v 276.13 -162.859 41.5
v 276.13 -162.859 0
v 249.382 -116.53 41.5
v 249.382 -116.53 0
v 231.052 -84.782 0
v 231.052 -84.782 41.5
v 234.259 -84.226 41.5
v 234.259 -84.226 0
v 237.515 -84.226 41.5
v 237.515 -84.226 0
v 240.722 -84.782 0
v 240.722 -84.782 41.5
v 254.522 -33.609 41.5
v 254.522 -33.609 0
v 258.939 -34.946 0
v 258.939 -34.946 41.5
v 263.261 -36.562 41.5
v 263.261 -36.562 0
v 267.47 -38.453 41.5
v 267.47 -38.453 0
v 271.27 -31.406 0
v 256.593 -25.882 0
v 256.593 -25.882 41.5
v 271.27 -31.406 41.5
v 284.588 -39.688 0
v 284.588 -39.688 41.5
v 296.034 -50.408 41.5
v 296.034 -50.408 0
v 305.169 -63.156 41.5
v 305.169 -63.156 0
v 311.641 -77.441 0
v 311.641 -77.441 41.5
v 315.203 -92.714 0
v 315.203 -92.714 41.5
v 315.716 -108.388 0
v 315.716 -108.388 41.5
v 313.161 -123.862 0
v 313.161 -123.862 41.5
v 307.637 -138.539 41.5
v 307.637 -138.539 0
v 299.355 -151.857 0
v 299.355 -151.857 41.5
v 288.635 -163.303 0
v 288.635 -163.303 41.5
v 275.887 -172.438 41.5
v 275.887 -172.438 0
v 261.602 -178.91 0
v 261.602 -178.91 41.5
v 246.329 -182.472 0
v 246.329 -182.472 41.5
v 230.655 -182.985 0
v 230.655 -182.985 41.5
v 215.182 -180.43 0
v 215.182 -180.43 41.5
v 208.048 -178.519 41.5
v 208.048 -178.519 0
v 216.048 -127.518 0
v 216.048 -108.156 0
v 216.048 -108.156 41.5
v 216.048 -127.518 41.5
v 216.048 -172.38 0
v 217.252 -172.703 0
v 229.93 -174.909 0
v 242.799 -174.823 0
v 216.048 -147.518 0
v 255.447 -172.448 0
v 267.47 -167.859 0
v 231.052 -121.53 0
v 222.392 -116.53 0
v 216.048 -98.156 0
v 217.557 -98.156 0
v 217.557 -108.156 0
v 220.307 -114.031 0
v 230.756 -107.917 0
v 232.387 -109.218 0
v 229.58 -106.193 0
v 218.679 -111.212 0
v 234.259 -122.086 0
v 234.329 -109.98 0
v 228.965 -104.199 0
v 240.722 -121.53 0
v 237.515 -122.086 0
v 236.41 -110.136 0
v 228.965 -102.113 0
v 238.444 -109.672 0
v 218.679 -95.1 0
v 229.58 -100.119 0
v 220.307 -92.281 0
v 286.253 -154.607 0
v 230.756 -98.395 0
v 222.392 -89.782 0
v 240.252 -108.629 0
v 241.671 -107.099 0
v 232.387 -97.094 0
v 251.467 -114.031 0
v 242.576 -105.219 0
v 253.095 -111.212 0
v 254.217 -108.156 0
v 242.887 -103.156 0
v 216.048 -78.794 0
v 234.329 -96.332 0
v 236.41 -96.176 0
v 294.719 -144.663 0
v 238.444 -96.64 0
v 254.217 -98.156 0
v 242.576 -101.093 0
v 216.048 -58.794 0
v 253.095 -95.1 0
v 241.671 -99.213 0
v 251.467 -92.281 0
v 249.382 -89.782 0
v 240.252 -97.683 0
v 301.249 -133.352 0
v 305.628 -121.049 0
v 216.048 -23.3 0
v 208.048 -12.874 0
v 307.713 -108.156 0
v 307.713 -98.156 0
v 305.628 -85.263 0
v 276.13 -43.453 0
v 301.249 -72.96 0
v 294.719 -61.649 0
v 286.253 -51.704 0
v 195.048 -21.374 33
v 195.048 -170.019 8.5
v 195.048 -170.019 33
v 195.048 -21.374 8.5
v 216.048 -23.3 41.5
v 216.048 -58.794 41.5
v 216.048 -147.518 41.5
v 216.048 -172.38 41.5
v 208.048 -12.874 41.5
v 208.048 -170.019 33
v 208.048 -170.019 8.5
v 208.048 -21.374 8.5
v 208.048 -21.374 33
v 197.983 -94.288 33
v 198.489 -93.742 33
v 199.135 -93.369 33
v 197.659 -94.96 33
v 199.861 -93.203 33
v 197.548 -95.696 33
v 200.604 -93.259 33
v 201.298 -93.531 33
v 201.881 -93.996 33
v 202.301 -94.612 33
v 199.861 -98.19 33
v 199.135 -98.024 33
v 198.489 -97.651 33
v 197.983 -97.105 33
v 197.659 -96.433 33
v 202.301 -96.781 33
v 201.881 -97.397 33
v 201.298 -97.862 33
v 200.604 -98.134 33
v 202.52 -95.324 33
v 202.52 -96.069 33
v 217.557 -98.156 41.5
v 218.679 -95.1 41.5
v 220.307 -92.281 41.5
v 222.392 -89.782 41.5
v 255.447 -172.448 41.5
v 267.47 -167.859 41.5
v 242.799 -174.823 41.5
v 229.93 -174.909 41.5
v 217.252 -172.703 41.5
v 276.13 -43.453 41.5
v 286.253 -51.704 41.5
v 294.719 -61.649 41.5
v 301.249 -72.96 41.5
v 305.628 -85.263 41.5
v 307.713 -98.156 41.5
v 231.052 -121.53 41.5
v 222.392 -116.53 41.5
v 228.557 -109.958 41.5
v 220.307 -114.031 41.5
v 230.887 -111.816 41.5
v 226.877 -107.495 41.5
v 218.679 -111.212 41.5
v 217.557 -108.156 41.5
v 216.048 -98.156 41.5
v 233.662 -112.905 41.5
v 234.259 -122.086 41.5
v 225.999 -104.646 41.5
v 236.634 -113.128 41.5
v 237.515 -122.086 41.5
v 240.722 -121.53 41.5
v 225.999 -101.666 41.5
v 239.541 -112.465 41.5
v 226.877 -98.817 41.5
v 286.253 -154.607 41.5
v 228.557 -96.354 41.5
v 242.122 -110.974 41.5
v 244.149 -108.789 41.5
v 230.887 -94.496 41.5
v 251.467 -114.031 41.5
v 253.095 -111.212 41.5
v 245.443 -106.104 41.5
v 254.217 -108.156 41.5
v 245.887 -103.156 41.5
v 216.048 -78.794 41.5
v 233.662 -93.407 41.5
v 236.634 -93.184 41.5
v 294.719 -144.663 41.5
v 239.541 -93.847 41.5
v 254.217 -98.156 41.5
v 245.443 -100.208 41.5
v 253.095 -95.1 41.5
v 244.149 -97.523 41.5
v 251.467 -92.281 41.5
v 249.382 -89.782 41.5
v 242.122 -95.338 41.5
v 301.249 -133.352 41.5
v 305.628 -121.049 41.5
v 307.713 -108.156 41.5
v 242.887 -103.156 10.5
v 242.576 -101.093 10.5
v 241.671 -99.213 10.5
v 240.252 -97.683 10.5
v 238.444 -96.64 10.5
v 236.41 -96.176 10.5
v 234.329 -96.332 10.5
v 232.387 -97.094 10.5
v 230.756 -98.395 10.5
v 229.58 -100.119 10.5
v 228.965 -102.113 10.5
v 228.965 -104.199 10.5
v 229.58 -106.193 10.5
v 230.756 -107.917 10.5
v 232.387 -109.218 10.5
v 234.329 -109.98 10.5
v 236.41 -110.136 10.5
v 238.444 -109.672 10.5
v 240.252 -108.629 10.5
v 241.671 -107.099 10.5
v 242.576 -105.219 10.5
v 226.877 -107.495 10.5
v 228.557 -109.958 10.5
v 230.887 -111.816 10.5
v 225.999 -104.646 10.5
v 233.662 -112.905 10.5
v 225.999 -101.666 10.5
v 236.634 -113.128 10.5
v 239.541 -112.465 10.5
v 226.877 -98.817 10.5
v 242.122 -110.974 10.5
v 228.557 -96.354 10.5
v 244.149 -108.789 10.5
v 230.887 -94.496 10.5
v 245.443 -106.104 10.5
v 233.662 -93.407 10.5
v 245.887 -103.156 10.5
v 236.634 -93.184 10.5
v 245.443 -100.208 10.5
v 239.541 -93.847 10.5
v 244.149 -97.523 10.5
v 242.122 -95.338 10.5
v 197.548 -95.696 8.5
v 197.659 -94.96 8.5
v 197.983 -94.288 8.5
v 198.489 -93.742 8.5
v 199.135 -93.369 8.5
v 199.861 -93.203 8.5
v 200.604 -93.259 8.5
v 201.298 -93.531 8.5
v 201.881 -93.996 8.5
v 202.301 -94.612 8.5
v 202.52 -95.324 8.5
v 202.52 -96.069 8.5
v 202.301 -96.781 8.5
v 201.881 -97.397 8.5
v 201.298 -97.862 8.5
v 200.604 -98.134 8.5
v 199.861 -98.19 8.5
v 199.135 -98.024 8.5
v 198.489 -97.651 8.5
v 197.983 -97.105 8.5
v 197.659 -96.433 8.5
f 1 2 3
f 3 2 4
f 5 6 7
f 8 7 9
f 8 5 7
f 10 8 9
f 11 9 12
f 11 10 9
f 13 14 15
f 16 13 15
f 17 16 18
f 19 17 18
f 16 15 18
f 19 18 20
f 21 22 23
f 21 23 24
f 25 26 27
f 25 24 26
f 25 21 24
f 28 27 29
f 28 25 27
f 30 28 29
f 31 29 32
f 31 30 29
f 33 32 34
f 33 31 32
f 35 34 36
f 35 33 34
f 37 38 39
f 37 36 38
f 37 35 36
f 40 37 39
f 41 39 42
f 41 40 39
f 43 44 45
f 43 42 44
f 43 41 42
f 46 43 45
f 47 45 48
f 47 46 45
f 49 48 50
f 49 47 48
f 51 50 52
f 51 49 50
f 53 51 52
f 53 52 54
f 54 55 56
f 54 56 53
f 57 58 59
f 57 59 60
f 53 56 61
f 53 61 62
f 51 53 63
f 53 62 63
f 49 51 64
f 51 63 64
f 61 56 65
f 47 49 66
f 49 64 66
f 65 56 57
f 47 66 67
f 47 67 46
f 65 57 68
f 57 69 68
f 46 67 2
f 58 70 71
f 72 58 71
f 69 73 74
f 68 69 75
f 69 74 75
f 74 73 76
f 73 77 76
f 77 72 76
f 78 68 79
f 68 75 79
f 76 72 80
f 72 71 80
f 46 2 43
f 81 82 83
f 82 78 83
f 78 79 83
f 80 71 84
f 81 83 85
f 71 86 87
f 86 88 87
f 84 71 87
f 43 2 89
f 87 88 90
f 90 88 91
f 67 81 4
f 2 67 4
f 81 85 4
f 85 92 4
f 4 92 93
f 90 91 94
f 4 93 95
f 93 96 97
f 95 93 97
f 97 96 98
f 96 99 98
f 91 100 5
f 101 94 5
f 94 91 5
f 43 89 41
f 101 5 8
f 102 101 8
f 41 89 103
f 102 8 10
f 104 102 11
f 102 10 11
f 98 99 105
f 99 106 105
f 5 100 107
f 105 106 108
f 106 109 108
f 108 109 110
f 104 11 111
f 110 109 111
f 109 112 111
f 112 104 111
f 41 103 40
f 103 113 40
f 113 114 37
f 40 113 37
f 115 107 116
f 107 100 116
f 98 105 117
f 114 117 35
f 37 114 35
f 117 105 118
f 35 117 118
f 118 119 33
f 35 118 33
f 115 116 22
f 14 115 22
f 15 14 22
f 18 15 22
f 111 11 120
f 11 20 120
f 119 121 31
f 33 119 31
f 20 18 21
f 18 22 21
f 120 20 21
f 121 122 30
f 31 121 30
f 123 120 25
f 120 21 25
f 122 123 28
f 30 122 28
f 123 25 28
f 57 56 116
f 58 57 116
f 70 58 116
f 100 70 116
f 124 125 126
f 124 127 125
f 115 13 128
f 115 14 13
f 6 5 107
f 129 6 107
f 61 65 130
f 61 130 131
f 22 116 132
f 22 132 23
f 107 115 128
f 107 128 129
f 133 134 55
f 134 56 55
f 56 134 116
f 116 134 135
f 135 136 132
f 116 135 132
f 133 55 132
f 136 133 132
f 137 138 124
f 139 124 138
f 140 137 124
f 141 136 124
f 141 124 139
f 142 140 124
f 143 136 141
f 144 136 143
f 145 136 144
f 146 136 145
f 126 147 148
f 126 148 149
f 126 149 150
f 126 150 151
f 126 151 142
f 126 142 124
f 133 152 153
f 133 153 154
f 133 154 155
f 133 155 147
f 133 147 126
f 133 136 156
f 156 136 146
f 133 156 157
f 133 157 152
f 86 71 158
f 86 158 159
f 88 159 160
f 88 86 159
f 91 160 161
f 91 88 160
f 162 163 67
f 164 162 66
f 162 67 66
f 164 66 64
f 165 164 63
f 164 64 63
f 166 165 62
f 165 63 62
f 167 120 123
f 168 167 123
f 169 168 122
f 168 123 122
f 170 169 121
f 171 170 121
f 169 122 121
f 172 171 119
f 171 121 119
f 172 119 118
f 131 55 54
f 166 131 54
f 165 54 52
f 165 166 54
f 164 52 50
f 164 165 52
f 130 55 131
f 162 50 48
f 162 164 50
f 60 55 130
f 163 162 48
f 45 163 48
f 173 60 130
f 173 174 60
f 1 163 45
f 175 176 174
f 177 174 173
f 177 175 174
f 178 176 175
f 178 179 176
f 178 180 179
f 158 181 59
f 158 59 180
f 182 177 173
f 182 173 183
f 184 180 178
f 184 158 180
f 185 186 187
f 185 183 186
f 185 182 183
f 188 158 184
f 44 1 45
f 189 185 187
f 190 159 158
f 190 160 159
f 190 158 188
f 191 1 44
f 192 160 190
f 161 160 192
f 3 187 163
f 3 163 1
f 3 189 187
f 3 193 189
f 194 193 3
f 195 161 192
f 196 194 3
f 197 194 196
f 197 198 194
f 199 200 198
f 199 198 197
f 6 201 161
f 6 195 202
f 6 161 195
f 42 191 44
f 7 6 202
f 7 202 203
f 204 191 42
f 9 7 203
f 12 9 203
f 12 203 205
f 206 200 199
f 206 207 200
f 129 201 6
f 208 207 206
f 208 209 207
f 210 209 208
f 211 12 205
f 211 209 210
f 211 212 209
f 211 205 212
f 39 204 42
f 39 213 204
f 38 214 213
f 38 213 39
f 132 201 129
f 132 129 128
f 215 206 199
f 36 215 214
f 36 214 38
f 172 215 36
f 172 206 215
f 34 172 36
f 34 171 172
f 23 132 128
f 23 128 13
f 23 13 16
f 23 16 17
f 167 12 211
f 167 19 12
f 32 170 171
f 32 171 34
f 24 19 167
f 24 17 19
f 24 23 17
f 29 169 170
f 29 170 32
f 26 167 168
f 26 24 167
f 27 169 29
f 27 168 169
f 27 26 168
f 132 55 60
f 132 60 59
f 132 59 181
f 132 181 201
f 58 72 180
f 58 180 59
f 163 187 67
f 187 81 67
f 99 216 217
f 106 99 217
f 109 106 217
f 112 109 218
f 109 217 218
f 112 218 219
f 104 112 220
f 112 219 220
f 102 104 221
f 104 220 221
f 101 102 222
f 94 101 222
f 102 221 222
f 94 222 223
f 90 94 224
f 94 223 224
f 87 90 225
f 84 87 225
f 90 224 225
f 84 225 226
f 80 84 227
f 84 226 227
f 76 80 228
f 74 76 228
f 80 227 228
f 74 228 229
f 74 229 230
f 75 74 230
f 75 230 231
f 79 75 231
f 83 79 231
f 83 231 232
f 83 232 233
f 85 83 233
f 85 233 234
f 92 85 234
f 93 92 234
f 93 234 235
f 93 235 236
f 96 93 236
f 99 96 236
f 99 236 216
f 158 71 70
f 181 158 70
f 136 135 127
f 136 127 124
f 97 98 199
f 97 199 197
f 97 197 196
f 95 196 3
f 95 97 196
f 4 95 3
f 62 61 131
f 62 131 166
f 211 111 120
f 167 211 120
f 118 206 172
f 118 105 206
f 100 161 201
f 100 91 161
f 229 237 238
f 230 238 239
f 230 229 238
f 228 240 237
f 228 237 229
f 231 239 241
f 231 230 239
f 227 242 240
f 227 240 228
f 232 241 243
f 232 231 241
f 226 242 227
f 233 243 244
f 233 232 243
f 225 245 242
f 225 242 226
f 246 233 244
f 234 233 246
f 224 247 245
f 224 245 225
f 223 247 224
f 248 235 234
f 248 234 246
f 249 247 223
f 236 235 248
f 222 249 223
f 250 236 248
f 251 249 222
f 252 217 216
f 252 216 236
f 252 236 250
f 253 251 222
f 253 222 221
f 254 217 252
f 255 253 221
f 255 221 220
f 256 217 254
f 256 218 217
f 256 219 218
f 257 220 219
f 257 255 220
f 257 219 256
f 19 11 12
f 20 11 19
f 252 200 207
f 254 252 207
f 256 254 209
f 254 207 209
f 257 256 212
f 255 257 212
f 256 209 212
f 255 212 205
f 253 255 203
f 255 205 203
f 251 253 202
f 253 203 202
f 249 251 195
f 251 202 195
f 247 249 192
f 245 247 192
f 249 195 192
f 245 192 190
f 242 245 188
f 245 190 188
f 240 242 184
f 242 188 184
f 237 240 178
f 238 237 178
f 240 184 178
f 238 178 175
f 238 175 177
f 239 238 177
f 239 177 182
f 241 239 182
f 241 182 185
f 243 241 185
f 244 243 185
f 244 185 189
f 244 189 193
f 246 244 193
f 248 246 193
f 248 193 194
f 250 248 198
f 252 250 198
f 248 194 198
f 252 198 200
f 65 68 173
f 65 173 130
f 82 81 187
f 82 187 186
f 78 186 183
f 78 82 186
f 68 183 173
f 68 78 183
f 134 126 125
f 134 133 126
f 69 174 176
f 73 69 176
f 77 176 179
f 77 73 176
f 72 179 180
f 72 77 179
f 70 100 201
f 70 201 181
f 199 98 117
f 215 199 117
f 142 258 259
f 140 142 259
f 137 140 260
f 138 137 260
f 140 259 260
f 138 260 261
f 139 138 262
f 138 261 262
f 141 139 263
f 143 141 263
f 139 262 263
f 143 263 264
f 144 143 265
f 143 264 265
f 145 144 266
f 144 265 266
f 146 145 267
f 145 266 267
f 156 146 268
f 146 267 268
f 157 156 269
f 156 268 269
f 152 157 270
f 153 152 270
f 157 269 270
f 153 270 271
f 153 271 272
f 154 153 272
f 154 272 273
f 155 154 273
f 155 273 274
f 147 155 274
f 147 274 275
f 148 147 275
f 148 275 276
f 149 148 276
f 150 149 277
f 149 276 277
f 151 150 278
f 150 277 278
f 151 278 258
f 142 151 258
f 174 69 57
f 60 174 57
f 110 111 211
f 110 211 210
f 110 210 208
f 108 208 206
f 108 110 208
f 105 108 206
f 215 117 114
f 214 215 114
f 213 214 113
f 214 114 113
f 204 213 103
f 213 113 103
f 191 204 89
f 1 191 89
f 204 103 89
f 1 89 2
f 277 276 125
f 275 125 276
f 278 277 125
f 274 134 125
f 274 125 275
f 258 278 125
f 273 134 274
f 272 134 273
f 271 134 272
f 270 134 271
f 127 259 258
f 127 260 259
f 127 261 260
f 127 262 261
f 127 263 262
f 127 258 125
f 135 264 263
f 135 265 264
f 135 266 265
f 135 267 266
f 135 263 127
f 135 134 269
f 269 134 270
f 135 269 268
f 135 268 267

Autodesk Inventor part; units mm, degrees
ref_plane "YZ Plane" through (0, 0, 0) normal (1, 0, 0) x (0, 1, 0)
ref_plane "XZ Plane" through (0, 0, 0) normal (0, 1, 0) x (-1, 0, 0)
ref_plane "XY Plane" through (0, 0, 0) normal (0, 0, 1) x (1, 0, 0)
sketch "Sketch1" plane through (0, 0, 0) normal (0, 0, 1) x (1, 0, 0)
  line L0 (0, 0) -> (160, 0)
  line L1 (160, 0) -> (118.589, -154.5481) construction
  line L2 (0, 0) -> (41.411, -154.5481) construction
  line L3 (41.411, -154.5481) -> (118.589, -154.5481)
  circle A0 centre (235.8871, -103.156) radius 80 construction
  line L4 (160, 0) -> (256.5926, -25.8819)
  line L5 (118.589, -154.5481) -> (215.1815, -180.43)
  arc A1 (215.1815, -180.43) -> (256.5926, -25.8819) centre (235.8871, -103.156) ccw
  circle A2 centre (-75.8871, -103.156) radius 80 construction
  line L6 (0, 0) -> (-96.5926, -25.8819)
  line L7 (41.411, -154.5481) -> (-55.1815, -180.43)
  arc A3 (-96.5926, -25.8819) -> (-55.1815, -180.43) centre (-75.8871, -103.156) ccw
  dimension "d0" = 160
  dimension "d1" = 160
  dimension "d2" = 160
  dimension "d3" = 75
  dimension "d4" = 75
  dimension "d5" = 160
  dimension "d6" = 100
  dimension "d7" = 160
  dimension "d9" = 100
extrude "Extrusion1" add sketch "Sketch1" along normal blind 41.5
sketch "Sketch2" plane through (0, 0, 41.5) normal (0, 0, 1) x (1, 0, 0)
  line L0 (-26.5, -133) -> (186.5, -133)
  line L1 (186.5, -133) -> (186.5, -20)
  line L2 (186.5, -20) -> (-26.5, -20)
  line L3 (-26.5, -20) -> (-26.5, -133)
  line L4 (160, 0) -> (0, 0) projected
  point P0 (80, -20)
  point P1 (80, 0)
  dimension "d12" = 213
  dimension "d13" = 113
  dimension "d14" = 20
extrude "Extrusion2" cut sketch "Sketch2" against normal through all
sketch "Sketch3" plane through (0, 0, 41.5) normal (0, 0, 1) x (1, 0, 0)
  line L0 (-26.5, -133) -> (-26.5, -20) construction
  line L1 (-26.5, -20) -> (186.5, -20) construction
  line L2 (186.5, -20) -> (186.5, -133) construction
  line L3 (186.5, -133) -> (-26.5, -133) construction
  line L4 (-48.0481, 1.5481) -> (-48.0481, -154.5481) construction
  line L5 (-48.0481, -154.5481) -> (208.0481, -154.5481) construction
  line L6 (208.0481, -154.5481) -> (208.0481, 1.5481) construction
  line L7 (208.0481, 1.5481) -> (-48.0481, 1.5481) construction
  line L8 (41.411, -154.5481) -> (118.589, -154.5481) construction
  line L9 (-48.0481, 1.5481) -> (-48.0481, -178.5186) construction
  line L10 (-55.1815, -180.43) -> (41.411, -154.5481) construction
  line L11 (208.0481, 1.5481) -> (208.0481, -178.5186) construction
  line L12 (118.589, -154.5481) -> (215.1815, -180.43) construction
  line L13 (-48.0481, -178.5186) -> (208.0481, -178.5186) construction
  line L14 (-48.0481, 1.5481) -> (208.0481, 1.5481) construction
  line L15 (160, 0) -> (256.5926, -25.8819) construction
  line L16 (208.2963, -12.941) -> (208.0481, -178.5186)
  line L17 (208.2963, -12.941) -> (256.5926, -25.8819)
  line L18 (208.0481, -178.5186) -> (215.1815, -180.43)
  arc A0 (215.1815, -180.43) -> (256.5926, -25.8819) centre (235.8871, -103.156) ccw
  line L19 (208.0481, 1.5481) -> (-166.9519, 1.5481)
  line L20 (-166.9519, 1.5481) -> (-166.9519, -188.4519)
  line L21 (-166.9519, -188.4519) -> (208.0481, -188.4519)
  line L22 (208.0481, -188.4519) -> (208.0481, 1.5481)
  point P0 (0, 0)
  point P1 (80, -154.5481)
  dimension "d17" = 190
  dimension "d18" = 375
extrude "Extrusion3" cut sketch "Sketch3" against normal through all contours L22 L21 L20 L19
sketch "Sketch4" plane through (0, 0, 41.5) normal (0, 0, 1) x (1, 0, 0)
  arc A0 (215.1815, -180.43) -> (256.5926, -25.8819) centre (235.8871, -103.156) ccw projected
  circle A1 centre (235.8871, -103.156) radius 7
  point P0 (0, 0)
  dimension "d21" = 14
extrude "Extrusion4" cut sketch "Sketch4" against normal through all
sketch "Sketch5" plane through (208.0481, -178.5186, 41.5) normal (-1, 0, 0) x (0, 0, 1)
  line L0 (-41.5, 165.6442) -> (0, 165.6442) projected
  line L1 (-41.5, 0) -> (-41.5, 165.6442) projected
  line L2 (0, 0) -> (-41.5, 0) projected
  line L3 (0, 165.6442) -> (0, 0) projected
  line L4 (-33, 157.1442) -> (-8.5, 157.1442)
  line L5 (-8.5, 157.1442) -> (-8.5, 8.5)
  line L6 (-8.5, 8.5) -> (-33, 8.5)
  line L7 (-33, 8.5) -> (-33, 157.1442)
  point P0 (-41.5, 178.5186)
  dimension "d24" = 8.5
extrude "Extrusion5" add sketch "Sketch5" along normal blind 13 contours L4 L5 L6 L7
sketch "Sketch6" plane through (208.0481, -170.0186, 8.5) normal (0, 0, -1) x (-1, 0, 0)
  circle A0 centre (8, 74.3221) radius 2.5
  line L0 (0, -8.5) -> (0, 157.1442) projected
  point P0 (208.0481, 170.0186)
  point P1 (0, 74.3221)
  dimension "d27" = 5
  dimension "d28" = 8
extrude "Extrusion6" cut sketch "Sketch6" against normal through all
sketch "Sketch7" plane through (0, 0, 0) normal (0, 0, -1) x (-1, 0, 0)
  circle A0 centre (-235.8871, -103.156) radius 7 projected
  line L0 (-208.0481, -178.5186) -> (-208.0481, -12.8745) projected
  line L1 (-208.0481, -12.8745) -> (-256.5926, -25.8819) projected
  arc A1 (-256.5926, -25.8819) -> (-215.1815, -180.43) centre (-235.8871, -103.156) ccw projected
  line L2 (-215.1815, -180.43) -> (-208.0481, -178.5186) projected
  line L3 (-254.522, -33.6093) -> (-216.0481, -23.3003)
  line L4 (-216.0481, -23.3003) -> (-216.0481, -172.38)
  line L5 (-216.0481, -172.38) -> (-217.2521, -172.7026)
  arc A2 (-254.522, -33.6093) -> (-217.2521, -172.7026) centre (-235.8871, -103.156) ccw
  circle A3 centre (-235.8871, -103.156) radius 19
  point P0 (0, 0)
  dimension "d31" = 8
  dimension "d32" = 12
extrude "Extrusion7" cut sketch "Sketch7" against normal through all contours L3 L4 L5 A2
sketch "Sketch8" plane through (0, 0, 0) normal (0, 0, -1) x (-1, 0, 0)
  circle A0 centre (-235.8871, -103.156) radius 7 construction
  circle A1 centre (-235.8871, -103.156) radius 19 construction
  line L0 (-235.8871, -103.156) -> (-159.7277, -103.156) construction
  line L1 (-217.5568, -98.156) -> (-123.6167, -98.156) construction
  line L2 (-217.5568, -108.156) -> (-123.6167, -108.156) construction
  line L3 (-231.052, -84.7815) -> (-184.082, -3.427) construction
  line L4 (-222.3918, -89.7815) -> (-175.4217, -8.427) construction
  line L5 (-249.3823, -89.7815) -> (-296.3524, -8.427) construction
  line L6 (-240.7221, -84.7815) -> (-287.6921, -3.427) construction
  line L7 (-254.2174, -108.156) -> (-348.1575, -108.156) construction
  line L8 (-254.2174, -98.156) -> (-348.1575, -98.156) construction
  line L9 (-240.7221, -121.5305) -> (-287.6921, -202.885) construction
  line L10 (-249.3823, -116.5305) -> (-296.3524, -197.885) construction
  line L11 (-222.3918, -116.5305) -> (-175.4217, -197.885) construction
  line L12 (-231.052, -121.5305) -> (-184.082, -202.885) construction
  line L13 (-216.0481, -23.3003) -> (-216.0481, -172.38) construction
  arc A2 (-254.522, -33.6093) -> (-217.2521, -172.7026) centre (-235.8871, -103.156) ccw construction
  line L14 (-254.522, -33.6093) -> (-216.0481, -23.3003) construction
  line L15 (-216.0481, -172.38) -> (-217.2521, -172.7026) construction
  line L16 (-217.5568, -98.156) -> (-216.0481, -98.156)
  line L17 (-217.5568, -108.156) -> (-216.0481, -108.156)
  line L18 (-222.3918, -116.5305) -> (-216.0481, -127.518)
  line L19 (-231.052, -121.5305) -> (-216.0481, -147.518)
  line L20 (-240.7221, -121.5305) -> (-267.47, -167.8593)
  line L21 (-276.1303, -162.8593) -> (-249.3823, -116.5305)
  line L22 (-254.2174, -108.156) -> (-307.7132, -108.156)
  line L23 (-254.2174, -98.156) -> (-307.7132, -98.156)
  line L24 (-249.3823, -89.7815) -> (-276.1303, -43.4527)
  line L25 (-240.7221, -84.7815) -> (-267.47, -38.4527)
  line L26 (-231.052, -84.7815) -> (-216.0481, -58.7939)
  line L27 (-222.3918, -89.7815) -> (-216.0481, -78.7939)
  line L28 (-216.0481, -58.7939) -> (-216.0481, -78.7939)
  line L29 (-216.0481, -98.156) -> (-216.0481, -108.156)
  line L30 (-216.0481, -127.518) -> (-216.0481, -147.518)
  arc A3 (-267.47, -38.4527) -> (-276.1303, -43.4527) centre (-235.8871, -103.156) ccw
  arc A4 (-307.7132, -98.156) -> (-307.7132, -108.156) centre (-235.8871, -103.156) ccw
  arc A5 (-276.1303, -162.8593) -> (-267.47, -167.8593) centre (-235.8871, -103.156) ccw
  arc A6 (-217.5568, -108.156) -> (-217.5568, -98.156) centre (-235.8871, -103.156) ccw
  arc A7 (-231.052, -121.5305) -> (-222.3918, -116.5305) centre (-235.8871, -103.156) ccw
  arc A8 (-249.3823, -116.5305) -> (-240.7221, -121.5305) centre (-235.8871, -103.156) ccw
  arc A9 (-254.2174, -98.156) -> (-254.2174, -108.156) centre (-235.8871, -103.156) ccw
  arc A10 (-240.7221, -84.7815) -> (-249.3823, -89.7815) centre (-235.8871, -103.156) ccw
  arc A11 (-222.3918, -89.7815) -> (-231.052, -84.7815) centre (-235.8871, -103.156) ccw
  point P0 (0, 0)
  dimension "d36" = 5
  dimension "d37" = 5
  dimension "d40" = 360
extrude "Extrusion8" add sketch "Sketch8" against normal blind 41.5
sketch "Sketch9" plane through (0, 0, 41.5) normal (0, 0, 1) x (1, 0, 0)
  circle A0 centre (235.8871, -103.156) radius 7 projected
  circle A1 centre (235.8871, -103.156) radius 10
  point P0 (0, 0)
  dimension "d46" = 20
extrude "Extrusion9" cut sketch "Sketch9" against normal blind 31
properties part number "Riser Base" material "ABS Plastic"
